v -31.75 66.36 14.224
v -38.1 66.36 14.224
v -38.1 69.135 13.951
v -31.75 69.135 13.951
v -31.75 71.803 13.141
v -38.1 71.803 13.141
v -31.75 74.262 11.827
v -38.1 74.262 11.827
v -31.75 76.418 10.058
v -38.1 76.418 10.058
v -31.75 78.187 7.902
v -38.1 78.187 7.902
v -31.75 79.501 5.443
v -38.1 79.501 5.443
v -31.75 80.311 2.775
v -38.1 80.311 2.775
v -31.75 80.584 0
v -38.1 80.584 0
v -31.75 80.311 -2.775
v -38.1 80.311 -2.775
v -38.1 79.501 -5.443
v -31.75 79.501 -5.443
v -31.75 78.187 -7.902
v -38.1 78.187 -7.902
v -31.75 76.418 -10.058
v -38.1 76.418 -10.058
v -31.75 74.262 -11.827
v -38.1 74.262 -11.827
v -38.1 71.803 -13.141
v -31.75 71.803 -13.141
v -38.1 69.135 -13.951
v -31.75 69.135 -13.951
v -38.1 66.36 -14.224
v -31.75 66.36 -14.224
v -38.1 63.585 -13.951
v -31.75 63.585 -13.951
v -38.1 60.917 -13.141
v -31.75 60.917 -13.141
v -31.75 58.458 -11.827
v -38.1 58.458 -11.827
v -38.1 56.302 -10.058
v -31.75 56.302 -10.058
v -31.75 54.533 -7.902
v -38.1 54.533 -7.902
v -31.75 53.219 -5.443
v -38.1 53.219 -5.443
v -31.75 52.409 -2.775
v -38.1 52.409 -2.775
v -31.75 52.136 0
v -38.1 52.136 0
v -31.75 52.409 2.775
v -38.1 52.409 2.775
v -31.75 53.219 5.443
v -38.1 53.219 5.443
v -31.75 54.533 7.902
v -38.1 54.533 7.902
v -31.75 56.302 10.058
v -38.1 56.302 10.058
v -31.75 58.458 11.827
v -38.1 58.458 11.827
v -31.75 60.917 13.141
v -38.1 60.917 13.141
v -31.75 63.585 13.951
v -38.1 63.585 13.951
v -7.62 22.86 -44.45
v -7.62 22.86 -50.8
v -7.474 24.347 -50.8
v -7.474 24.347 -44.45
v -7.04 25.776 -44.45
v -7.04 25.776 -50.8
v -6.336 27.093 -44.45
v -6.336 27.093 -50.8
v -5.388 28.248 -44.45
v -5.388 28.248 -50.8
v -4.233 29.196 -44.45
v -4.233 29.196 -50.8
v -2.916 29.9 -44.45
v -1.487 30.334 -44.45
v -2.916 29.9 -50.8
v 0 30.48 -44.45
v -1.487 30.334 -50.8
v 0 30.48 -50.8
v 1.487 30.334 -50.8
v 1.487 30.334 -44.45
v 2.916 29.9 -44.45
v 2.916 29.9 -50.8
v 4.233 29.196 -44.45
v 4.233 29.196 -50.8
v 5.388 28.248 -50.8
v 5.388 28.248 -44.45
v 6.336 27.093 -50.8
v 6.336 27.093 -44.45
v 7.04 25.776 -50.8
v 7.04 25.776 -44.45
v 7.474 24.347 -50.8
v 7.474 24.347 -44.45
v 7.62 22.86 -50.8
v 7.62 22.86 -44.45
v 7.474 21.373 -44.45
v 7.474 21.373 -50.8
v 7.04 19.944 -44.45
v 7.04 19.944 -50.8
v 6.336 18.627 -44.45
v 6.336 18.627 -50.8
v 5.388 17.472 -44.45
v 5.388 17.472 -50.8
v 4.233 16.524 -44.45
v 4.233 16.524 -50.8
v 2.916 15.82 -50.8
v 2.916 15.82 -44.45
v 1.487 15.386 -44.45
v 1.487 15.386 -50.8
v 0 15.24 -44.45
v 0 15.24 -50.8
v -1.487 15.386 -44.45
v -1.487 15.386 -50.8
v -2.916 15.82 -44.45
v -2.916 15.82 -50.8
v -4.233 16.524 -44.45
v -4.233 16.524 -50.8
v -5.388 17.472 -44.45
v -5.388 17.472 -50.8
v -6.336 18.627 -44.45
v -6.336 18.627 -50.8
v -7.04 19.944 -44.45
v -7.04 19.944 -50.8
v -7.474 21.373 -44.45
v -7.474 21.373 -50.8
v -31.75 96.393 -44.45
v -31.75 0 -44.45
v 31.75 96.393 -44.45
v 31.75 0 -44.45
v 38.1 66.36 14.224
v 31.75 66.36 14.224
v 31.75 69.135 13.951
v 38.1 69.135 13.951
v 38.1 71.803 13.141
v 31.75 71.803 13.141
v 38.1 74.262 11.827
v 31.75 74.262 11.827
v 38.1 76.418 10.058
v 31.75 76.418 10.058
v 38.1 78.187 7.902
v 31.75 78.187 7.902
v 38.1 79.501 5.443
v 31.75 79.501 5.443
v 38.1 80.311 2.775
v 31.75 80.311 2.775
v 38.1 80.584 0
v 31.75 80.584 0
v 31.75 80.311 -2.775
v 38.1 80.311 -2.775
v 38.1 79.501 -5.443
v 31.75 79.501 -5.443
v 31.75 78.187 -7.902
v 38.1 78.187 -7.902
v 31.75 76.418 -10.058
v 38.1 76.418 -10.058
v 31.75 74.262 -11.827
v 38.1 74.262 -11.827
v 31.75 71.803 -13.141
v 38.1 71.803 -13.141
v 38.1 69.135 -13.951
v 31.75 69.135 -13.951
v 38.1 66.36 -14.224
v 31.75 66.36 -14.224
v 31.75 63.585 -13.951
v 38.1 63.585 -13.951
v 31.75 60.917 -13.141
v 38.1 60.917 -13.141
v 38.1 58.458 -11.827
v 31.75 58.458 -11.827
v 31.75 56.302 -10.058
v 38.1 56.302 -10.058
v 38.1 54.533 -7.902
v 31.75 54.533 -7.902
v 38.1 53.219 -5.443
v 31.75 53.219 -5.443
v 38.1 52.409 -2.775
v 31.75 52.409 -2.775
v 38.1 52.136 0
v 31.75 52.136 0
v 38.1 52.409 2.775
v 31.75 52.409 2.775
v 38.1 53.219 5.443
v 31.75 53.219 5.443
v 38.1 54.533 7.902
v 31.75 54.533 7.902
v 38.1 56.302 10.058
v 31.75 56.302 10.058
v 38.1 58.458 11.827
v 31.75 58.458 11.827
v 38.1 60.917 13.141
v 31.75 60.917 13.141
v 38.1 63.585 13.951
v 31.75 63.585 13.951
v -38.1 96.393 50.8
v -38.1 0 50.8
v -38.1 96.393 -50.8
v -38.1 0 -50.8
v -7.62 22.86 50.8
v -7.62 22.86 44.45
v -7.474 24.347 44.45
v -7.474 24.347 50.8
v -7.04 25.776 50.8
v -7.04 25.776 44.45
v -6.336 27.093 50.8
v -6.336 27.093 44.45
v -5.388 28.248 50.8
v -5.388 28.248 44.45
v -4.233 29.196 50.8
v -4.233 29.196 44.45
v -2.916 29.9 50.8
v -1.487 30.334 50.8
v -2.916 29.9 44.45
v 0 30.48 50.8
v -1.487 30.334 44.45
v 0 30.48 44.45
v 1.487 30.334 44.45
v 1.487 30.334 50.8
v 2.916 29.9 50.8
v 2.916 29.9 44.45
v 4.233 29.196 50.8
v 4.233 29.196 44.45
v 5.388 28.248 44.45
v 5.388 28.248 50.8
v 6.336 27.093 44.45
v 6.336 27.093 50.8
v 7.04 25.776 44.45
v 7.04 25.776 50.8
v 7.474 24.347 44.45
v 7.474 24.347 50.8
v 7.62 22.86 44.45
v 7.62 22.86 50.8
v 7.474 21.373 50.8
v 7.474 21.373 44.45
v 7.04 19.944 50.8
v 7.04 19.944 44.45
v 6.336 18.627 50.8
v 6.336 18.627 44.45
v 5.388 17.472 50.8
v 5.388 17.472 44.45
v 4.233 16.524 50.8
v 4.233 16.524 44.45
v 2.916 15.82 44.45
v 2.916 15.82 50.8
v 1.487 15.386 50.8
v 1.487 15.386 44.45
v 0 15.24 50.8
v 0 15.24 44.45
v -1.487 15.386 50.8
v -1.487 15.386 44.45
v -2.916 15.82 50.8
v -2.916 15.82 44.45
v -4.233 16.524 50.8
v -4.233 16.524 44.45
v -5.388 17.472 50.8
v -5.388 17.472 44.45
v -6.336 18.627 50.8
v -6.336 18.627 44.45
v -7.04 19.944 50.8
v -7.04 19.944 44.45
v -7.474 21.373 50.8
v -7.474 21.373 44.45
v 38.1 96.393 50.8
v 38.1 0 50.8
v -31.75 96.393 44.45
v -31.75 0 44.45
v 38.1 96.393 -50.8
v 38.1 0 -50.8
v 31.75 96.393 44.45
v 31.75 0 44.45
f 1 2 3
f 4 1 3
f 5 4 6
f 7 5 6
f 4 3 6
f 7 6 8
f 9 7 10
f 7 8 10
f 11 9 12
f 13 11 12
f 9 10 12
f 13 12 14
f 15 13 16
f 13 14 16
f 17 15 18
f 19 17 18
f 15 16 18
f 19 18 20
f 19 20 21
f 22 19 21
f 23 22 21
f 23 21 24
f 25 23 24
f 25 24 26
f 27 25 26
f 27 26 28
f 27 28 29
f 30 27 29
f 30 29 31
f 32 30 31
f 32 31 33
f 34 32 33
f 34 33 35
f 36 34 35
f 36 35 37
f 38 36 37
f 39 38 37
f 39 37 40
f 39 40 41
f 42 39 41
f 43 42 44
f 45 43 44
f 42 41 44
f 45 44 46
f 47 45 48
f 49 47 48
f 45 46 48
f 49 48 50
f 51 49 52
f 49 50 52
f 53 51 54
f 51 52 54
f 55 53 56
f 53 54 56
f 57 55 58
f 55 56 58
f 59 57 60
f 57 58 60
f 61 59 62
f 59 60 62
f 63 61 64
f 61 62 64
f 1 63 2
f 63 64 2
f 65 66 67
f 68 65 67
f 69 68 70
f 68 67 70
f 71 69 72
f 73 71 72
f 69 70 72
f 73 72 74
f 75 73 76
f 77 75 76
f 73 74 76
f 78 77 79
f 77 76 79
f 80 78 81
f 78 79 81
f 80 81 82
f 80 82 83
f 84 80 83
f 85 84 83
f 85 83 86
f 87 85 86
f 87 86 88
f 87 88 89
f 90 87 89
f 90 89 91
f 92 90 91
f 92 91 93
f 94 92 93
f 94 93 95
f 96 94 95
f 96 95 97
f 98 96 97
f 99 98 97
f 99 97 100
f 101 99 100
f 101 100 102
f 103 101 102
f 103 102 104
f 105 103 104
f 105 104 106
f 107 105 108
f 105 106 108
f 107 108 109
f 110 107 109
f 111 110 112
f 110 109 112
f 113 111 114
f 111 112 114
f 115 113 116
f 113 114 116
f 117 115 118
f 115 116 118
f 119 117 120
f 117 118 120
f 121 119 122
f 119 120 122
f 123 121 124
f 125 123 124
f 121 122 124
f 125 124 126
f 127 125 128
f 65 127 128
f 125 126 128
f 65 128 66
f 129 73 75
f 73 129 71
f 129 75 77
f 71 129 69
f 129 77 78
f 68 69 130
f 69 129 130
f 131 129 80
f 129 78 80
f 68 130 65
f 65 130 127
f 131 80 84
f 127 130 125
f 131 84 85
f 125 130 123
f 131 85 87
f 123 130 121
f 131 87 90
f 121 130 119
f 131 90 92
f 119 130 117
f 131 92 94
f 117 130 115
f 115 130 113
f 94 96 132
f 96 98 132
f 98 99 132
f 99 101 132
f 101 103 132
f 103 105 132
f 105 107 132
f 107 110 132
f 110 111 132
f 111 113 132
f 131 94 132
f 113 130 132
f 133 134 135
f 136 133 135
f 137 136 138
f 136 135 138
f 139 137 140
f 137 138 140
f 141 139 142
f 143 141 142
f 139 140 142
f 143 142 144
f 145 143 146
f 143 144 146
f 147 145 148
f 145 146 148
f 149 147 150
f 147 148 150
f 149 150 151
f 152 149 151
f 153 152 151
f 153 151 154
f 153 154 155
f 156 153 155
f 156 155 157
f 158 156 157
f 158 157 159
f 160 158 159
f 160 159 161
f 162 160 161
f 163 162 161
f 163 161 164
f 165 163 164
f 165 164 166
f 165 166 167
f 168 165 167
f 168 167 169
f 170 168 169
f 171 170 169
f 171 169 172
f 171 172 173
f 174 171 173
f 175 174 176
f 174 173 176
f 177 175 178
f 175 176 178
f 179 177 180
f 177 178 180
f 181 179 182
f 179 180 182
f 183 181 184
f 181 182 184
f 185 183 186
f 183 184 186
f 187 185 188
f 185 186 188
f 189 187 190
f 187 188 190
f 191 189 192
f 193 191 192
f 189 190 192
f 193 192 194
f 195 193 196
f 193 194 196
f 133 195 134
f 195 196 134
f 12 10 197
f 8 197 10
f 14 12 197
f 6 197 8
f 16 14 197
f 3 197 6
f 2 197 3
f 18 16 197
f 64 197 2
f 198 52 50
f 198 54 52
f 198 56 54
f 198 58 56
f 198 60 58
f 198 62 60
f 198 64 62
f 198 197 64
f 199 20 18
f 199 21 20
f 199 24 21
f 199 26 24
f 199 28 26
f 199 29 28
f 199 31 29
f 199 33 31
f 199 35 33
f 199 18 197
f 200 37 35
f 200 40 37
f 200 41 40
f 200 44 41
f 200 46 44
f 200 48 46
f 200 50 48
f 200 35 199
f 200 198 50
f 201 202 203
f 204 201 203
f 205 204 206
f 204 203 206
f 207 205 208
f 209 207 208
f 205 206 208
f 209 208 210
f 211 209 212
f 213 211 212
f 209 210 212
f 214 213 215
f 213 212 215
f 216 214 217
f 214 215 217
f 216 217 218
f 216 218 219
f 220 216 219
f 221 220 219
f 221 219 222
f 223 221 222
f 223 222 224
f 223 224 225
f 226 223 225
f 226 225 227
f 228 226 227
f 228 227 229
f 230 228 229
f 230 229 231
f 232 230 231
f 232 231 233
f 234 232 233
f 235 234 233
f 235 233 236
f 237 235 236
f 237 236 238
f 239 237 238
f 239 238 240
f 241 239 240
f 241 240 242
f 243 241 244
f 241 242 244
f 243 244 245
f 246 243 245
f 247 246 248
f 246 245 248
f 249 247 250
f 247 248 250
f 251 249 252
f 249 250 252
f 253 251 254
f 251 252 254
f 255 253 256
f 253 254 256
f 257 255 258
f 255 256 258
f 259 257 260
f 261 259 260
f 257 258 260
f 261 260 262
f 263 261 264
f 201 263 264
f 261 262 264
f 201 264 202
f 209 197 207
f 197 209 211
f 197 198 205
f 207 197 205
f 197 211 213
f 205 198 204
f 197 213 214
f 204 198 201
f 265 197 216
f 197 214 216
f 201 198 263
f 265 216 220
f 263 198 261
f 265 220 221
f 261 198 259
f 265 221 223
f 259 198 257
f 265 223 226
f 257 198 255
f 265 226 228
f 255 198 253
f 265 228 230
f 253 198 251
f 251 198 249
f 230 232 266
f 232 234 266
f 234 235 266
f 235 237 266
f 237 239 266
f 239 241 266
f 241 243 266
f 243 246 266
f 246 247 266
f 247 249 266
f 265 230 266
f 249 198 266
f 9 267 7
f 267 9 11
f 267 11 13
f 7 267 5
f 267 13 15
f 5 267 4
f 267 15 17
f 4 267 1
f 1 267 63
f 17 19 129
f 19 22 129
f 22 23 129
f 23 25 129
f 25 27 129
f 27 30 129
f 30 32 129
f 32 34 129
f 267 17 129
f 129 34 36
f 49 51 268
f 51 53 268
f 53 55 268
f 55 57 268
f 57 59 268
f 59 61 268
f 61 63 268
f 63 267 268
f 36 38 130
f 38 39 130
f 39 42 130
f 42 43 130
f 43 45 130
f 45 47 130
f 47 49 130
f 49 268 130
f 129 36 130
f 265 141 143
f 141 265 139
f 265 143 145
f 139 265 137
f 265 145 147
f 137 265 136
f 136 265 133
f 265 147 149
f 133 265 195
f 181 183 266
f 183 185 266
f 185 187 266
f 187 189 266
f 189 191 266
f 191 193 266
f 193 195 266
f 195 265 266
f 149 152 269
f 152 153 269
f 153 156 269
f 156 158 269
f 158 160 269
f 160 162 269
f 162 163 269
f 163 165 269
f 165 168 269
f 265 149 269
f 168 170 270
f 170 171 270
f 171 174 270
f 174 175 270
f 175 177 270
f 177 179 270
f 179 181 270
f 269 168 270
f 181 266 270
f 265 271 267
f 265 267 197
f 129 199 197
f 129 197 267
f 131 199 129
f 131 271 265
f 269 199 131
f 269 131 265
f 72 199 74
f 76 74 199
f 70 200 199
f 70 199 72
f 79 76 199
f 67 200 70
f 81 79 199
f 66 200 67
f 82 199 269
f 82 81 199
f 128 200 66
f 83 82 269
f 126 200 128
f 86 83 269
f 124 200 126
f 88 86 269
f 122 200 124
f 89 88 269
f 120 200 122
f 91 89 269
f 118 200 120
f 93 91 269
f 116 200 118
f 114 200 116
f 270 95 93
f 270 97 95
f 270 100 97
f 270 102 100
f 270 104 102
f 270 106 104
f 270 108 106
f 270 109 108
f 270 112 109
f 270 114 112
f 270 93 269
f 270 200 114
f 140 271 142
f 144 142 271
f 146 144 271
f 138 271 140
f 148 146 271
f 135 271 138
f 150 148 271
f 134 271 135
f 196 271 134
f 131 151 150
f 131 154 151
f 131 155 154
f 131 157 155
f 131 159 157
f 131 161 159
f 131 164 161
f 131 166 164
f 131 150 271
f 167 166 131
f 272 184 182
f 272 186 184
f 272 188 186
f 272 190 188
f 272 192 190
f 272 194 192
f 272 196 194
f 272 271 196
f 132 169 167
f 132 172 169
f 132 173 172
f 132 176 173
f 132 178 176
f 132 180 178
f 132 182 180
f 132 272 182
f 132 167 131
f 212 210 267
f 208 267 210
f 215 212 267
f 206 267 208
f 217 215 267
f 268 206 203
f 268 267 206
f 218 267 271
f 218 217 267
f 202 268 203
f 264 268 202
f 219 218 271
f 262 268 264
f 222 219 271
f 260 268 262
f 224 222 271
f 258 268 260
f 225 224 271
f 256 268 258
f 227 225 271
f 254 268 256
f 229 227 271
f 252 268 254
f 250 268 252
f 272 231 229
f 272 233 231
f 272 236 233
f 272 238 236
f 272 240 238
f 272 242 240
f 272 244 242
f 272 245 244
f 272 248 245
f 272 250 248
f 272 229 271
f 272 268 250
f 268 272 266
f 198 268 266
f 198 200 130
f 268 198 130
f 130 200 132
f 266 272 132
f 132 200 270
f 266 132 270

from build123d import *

# Parameters (mm, degrees)
SKETCH2_W           = 76.2
SKETCH2_H           = 101.6
SKETCH2_W_2         = 63.5
SKETCH2_H_2         = 88.9
EXTRUDE_THIN1_DEPTH = 96.393
SKETCH3_R           = 7.62
CUT_EXTRUDE1_DEPTH  = 102.6
SKETCH4_R           = 14.224
CUT_EXTRUDE2_DEPTH  = 77.2


with BuildPart() as part:
    # Sketch2 → Extrude-Thin1 (new body)
    with BuildSketch(Plane(origin=(0, 0, 0), x_dir=(1, 0, 0), z_dir=(0, 1, 0))):
        Rectangle(SKETCH2_W, SKETCH2_H)
        Rectangle(SKETCH2_W_2, SKETCH2_H_2, mode=Mode.SUBTRACT)
    extrude(amount=EXTRUDE_THIN1_DEPTH)

    # Sketch3 → Cut-Extrude1 (cut, through all)
    with BuildSketch(Plane(origin=(0, 0, -50.8), x_dir=(-1, 0, 0), z_dir=(0, 0, -1))):
        with Locations((0, 22.86)):
            Circle(SKETCH3_R)
    extrude(amount=-CUT_EXTRUDE1_DEPTH, mode=Mode.SUBTRACT)

    # Sketch4 → Cut-Extrude2 (cut, through all)
    with BuildSketch(Plane.ZY.offset(38.1)):
        with Locations((0, 66.360000122)):
            Circle(SKETCH4_R)
    extrude(amount=-CUT_EXTRUDE2_DEPTH, mode=Mode.SUBTRACT)


solid = part.part
